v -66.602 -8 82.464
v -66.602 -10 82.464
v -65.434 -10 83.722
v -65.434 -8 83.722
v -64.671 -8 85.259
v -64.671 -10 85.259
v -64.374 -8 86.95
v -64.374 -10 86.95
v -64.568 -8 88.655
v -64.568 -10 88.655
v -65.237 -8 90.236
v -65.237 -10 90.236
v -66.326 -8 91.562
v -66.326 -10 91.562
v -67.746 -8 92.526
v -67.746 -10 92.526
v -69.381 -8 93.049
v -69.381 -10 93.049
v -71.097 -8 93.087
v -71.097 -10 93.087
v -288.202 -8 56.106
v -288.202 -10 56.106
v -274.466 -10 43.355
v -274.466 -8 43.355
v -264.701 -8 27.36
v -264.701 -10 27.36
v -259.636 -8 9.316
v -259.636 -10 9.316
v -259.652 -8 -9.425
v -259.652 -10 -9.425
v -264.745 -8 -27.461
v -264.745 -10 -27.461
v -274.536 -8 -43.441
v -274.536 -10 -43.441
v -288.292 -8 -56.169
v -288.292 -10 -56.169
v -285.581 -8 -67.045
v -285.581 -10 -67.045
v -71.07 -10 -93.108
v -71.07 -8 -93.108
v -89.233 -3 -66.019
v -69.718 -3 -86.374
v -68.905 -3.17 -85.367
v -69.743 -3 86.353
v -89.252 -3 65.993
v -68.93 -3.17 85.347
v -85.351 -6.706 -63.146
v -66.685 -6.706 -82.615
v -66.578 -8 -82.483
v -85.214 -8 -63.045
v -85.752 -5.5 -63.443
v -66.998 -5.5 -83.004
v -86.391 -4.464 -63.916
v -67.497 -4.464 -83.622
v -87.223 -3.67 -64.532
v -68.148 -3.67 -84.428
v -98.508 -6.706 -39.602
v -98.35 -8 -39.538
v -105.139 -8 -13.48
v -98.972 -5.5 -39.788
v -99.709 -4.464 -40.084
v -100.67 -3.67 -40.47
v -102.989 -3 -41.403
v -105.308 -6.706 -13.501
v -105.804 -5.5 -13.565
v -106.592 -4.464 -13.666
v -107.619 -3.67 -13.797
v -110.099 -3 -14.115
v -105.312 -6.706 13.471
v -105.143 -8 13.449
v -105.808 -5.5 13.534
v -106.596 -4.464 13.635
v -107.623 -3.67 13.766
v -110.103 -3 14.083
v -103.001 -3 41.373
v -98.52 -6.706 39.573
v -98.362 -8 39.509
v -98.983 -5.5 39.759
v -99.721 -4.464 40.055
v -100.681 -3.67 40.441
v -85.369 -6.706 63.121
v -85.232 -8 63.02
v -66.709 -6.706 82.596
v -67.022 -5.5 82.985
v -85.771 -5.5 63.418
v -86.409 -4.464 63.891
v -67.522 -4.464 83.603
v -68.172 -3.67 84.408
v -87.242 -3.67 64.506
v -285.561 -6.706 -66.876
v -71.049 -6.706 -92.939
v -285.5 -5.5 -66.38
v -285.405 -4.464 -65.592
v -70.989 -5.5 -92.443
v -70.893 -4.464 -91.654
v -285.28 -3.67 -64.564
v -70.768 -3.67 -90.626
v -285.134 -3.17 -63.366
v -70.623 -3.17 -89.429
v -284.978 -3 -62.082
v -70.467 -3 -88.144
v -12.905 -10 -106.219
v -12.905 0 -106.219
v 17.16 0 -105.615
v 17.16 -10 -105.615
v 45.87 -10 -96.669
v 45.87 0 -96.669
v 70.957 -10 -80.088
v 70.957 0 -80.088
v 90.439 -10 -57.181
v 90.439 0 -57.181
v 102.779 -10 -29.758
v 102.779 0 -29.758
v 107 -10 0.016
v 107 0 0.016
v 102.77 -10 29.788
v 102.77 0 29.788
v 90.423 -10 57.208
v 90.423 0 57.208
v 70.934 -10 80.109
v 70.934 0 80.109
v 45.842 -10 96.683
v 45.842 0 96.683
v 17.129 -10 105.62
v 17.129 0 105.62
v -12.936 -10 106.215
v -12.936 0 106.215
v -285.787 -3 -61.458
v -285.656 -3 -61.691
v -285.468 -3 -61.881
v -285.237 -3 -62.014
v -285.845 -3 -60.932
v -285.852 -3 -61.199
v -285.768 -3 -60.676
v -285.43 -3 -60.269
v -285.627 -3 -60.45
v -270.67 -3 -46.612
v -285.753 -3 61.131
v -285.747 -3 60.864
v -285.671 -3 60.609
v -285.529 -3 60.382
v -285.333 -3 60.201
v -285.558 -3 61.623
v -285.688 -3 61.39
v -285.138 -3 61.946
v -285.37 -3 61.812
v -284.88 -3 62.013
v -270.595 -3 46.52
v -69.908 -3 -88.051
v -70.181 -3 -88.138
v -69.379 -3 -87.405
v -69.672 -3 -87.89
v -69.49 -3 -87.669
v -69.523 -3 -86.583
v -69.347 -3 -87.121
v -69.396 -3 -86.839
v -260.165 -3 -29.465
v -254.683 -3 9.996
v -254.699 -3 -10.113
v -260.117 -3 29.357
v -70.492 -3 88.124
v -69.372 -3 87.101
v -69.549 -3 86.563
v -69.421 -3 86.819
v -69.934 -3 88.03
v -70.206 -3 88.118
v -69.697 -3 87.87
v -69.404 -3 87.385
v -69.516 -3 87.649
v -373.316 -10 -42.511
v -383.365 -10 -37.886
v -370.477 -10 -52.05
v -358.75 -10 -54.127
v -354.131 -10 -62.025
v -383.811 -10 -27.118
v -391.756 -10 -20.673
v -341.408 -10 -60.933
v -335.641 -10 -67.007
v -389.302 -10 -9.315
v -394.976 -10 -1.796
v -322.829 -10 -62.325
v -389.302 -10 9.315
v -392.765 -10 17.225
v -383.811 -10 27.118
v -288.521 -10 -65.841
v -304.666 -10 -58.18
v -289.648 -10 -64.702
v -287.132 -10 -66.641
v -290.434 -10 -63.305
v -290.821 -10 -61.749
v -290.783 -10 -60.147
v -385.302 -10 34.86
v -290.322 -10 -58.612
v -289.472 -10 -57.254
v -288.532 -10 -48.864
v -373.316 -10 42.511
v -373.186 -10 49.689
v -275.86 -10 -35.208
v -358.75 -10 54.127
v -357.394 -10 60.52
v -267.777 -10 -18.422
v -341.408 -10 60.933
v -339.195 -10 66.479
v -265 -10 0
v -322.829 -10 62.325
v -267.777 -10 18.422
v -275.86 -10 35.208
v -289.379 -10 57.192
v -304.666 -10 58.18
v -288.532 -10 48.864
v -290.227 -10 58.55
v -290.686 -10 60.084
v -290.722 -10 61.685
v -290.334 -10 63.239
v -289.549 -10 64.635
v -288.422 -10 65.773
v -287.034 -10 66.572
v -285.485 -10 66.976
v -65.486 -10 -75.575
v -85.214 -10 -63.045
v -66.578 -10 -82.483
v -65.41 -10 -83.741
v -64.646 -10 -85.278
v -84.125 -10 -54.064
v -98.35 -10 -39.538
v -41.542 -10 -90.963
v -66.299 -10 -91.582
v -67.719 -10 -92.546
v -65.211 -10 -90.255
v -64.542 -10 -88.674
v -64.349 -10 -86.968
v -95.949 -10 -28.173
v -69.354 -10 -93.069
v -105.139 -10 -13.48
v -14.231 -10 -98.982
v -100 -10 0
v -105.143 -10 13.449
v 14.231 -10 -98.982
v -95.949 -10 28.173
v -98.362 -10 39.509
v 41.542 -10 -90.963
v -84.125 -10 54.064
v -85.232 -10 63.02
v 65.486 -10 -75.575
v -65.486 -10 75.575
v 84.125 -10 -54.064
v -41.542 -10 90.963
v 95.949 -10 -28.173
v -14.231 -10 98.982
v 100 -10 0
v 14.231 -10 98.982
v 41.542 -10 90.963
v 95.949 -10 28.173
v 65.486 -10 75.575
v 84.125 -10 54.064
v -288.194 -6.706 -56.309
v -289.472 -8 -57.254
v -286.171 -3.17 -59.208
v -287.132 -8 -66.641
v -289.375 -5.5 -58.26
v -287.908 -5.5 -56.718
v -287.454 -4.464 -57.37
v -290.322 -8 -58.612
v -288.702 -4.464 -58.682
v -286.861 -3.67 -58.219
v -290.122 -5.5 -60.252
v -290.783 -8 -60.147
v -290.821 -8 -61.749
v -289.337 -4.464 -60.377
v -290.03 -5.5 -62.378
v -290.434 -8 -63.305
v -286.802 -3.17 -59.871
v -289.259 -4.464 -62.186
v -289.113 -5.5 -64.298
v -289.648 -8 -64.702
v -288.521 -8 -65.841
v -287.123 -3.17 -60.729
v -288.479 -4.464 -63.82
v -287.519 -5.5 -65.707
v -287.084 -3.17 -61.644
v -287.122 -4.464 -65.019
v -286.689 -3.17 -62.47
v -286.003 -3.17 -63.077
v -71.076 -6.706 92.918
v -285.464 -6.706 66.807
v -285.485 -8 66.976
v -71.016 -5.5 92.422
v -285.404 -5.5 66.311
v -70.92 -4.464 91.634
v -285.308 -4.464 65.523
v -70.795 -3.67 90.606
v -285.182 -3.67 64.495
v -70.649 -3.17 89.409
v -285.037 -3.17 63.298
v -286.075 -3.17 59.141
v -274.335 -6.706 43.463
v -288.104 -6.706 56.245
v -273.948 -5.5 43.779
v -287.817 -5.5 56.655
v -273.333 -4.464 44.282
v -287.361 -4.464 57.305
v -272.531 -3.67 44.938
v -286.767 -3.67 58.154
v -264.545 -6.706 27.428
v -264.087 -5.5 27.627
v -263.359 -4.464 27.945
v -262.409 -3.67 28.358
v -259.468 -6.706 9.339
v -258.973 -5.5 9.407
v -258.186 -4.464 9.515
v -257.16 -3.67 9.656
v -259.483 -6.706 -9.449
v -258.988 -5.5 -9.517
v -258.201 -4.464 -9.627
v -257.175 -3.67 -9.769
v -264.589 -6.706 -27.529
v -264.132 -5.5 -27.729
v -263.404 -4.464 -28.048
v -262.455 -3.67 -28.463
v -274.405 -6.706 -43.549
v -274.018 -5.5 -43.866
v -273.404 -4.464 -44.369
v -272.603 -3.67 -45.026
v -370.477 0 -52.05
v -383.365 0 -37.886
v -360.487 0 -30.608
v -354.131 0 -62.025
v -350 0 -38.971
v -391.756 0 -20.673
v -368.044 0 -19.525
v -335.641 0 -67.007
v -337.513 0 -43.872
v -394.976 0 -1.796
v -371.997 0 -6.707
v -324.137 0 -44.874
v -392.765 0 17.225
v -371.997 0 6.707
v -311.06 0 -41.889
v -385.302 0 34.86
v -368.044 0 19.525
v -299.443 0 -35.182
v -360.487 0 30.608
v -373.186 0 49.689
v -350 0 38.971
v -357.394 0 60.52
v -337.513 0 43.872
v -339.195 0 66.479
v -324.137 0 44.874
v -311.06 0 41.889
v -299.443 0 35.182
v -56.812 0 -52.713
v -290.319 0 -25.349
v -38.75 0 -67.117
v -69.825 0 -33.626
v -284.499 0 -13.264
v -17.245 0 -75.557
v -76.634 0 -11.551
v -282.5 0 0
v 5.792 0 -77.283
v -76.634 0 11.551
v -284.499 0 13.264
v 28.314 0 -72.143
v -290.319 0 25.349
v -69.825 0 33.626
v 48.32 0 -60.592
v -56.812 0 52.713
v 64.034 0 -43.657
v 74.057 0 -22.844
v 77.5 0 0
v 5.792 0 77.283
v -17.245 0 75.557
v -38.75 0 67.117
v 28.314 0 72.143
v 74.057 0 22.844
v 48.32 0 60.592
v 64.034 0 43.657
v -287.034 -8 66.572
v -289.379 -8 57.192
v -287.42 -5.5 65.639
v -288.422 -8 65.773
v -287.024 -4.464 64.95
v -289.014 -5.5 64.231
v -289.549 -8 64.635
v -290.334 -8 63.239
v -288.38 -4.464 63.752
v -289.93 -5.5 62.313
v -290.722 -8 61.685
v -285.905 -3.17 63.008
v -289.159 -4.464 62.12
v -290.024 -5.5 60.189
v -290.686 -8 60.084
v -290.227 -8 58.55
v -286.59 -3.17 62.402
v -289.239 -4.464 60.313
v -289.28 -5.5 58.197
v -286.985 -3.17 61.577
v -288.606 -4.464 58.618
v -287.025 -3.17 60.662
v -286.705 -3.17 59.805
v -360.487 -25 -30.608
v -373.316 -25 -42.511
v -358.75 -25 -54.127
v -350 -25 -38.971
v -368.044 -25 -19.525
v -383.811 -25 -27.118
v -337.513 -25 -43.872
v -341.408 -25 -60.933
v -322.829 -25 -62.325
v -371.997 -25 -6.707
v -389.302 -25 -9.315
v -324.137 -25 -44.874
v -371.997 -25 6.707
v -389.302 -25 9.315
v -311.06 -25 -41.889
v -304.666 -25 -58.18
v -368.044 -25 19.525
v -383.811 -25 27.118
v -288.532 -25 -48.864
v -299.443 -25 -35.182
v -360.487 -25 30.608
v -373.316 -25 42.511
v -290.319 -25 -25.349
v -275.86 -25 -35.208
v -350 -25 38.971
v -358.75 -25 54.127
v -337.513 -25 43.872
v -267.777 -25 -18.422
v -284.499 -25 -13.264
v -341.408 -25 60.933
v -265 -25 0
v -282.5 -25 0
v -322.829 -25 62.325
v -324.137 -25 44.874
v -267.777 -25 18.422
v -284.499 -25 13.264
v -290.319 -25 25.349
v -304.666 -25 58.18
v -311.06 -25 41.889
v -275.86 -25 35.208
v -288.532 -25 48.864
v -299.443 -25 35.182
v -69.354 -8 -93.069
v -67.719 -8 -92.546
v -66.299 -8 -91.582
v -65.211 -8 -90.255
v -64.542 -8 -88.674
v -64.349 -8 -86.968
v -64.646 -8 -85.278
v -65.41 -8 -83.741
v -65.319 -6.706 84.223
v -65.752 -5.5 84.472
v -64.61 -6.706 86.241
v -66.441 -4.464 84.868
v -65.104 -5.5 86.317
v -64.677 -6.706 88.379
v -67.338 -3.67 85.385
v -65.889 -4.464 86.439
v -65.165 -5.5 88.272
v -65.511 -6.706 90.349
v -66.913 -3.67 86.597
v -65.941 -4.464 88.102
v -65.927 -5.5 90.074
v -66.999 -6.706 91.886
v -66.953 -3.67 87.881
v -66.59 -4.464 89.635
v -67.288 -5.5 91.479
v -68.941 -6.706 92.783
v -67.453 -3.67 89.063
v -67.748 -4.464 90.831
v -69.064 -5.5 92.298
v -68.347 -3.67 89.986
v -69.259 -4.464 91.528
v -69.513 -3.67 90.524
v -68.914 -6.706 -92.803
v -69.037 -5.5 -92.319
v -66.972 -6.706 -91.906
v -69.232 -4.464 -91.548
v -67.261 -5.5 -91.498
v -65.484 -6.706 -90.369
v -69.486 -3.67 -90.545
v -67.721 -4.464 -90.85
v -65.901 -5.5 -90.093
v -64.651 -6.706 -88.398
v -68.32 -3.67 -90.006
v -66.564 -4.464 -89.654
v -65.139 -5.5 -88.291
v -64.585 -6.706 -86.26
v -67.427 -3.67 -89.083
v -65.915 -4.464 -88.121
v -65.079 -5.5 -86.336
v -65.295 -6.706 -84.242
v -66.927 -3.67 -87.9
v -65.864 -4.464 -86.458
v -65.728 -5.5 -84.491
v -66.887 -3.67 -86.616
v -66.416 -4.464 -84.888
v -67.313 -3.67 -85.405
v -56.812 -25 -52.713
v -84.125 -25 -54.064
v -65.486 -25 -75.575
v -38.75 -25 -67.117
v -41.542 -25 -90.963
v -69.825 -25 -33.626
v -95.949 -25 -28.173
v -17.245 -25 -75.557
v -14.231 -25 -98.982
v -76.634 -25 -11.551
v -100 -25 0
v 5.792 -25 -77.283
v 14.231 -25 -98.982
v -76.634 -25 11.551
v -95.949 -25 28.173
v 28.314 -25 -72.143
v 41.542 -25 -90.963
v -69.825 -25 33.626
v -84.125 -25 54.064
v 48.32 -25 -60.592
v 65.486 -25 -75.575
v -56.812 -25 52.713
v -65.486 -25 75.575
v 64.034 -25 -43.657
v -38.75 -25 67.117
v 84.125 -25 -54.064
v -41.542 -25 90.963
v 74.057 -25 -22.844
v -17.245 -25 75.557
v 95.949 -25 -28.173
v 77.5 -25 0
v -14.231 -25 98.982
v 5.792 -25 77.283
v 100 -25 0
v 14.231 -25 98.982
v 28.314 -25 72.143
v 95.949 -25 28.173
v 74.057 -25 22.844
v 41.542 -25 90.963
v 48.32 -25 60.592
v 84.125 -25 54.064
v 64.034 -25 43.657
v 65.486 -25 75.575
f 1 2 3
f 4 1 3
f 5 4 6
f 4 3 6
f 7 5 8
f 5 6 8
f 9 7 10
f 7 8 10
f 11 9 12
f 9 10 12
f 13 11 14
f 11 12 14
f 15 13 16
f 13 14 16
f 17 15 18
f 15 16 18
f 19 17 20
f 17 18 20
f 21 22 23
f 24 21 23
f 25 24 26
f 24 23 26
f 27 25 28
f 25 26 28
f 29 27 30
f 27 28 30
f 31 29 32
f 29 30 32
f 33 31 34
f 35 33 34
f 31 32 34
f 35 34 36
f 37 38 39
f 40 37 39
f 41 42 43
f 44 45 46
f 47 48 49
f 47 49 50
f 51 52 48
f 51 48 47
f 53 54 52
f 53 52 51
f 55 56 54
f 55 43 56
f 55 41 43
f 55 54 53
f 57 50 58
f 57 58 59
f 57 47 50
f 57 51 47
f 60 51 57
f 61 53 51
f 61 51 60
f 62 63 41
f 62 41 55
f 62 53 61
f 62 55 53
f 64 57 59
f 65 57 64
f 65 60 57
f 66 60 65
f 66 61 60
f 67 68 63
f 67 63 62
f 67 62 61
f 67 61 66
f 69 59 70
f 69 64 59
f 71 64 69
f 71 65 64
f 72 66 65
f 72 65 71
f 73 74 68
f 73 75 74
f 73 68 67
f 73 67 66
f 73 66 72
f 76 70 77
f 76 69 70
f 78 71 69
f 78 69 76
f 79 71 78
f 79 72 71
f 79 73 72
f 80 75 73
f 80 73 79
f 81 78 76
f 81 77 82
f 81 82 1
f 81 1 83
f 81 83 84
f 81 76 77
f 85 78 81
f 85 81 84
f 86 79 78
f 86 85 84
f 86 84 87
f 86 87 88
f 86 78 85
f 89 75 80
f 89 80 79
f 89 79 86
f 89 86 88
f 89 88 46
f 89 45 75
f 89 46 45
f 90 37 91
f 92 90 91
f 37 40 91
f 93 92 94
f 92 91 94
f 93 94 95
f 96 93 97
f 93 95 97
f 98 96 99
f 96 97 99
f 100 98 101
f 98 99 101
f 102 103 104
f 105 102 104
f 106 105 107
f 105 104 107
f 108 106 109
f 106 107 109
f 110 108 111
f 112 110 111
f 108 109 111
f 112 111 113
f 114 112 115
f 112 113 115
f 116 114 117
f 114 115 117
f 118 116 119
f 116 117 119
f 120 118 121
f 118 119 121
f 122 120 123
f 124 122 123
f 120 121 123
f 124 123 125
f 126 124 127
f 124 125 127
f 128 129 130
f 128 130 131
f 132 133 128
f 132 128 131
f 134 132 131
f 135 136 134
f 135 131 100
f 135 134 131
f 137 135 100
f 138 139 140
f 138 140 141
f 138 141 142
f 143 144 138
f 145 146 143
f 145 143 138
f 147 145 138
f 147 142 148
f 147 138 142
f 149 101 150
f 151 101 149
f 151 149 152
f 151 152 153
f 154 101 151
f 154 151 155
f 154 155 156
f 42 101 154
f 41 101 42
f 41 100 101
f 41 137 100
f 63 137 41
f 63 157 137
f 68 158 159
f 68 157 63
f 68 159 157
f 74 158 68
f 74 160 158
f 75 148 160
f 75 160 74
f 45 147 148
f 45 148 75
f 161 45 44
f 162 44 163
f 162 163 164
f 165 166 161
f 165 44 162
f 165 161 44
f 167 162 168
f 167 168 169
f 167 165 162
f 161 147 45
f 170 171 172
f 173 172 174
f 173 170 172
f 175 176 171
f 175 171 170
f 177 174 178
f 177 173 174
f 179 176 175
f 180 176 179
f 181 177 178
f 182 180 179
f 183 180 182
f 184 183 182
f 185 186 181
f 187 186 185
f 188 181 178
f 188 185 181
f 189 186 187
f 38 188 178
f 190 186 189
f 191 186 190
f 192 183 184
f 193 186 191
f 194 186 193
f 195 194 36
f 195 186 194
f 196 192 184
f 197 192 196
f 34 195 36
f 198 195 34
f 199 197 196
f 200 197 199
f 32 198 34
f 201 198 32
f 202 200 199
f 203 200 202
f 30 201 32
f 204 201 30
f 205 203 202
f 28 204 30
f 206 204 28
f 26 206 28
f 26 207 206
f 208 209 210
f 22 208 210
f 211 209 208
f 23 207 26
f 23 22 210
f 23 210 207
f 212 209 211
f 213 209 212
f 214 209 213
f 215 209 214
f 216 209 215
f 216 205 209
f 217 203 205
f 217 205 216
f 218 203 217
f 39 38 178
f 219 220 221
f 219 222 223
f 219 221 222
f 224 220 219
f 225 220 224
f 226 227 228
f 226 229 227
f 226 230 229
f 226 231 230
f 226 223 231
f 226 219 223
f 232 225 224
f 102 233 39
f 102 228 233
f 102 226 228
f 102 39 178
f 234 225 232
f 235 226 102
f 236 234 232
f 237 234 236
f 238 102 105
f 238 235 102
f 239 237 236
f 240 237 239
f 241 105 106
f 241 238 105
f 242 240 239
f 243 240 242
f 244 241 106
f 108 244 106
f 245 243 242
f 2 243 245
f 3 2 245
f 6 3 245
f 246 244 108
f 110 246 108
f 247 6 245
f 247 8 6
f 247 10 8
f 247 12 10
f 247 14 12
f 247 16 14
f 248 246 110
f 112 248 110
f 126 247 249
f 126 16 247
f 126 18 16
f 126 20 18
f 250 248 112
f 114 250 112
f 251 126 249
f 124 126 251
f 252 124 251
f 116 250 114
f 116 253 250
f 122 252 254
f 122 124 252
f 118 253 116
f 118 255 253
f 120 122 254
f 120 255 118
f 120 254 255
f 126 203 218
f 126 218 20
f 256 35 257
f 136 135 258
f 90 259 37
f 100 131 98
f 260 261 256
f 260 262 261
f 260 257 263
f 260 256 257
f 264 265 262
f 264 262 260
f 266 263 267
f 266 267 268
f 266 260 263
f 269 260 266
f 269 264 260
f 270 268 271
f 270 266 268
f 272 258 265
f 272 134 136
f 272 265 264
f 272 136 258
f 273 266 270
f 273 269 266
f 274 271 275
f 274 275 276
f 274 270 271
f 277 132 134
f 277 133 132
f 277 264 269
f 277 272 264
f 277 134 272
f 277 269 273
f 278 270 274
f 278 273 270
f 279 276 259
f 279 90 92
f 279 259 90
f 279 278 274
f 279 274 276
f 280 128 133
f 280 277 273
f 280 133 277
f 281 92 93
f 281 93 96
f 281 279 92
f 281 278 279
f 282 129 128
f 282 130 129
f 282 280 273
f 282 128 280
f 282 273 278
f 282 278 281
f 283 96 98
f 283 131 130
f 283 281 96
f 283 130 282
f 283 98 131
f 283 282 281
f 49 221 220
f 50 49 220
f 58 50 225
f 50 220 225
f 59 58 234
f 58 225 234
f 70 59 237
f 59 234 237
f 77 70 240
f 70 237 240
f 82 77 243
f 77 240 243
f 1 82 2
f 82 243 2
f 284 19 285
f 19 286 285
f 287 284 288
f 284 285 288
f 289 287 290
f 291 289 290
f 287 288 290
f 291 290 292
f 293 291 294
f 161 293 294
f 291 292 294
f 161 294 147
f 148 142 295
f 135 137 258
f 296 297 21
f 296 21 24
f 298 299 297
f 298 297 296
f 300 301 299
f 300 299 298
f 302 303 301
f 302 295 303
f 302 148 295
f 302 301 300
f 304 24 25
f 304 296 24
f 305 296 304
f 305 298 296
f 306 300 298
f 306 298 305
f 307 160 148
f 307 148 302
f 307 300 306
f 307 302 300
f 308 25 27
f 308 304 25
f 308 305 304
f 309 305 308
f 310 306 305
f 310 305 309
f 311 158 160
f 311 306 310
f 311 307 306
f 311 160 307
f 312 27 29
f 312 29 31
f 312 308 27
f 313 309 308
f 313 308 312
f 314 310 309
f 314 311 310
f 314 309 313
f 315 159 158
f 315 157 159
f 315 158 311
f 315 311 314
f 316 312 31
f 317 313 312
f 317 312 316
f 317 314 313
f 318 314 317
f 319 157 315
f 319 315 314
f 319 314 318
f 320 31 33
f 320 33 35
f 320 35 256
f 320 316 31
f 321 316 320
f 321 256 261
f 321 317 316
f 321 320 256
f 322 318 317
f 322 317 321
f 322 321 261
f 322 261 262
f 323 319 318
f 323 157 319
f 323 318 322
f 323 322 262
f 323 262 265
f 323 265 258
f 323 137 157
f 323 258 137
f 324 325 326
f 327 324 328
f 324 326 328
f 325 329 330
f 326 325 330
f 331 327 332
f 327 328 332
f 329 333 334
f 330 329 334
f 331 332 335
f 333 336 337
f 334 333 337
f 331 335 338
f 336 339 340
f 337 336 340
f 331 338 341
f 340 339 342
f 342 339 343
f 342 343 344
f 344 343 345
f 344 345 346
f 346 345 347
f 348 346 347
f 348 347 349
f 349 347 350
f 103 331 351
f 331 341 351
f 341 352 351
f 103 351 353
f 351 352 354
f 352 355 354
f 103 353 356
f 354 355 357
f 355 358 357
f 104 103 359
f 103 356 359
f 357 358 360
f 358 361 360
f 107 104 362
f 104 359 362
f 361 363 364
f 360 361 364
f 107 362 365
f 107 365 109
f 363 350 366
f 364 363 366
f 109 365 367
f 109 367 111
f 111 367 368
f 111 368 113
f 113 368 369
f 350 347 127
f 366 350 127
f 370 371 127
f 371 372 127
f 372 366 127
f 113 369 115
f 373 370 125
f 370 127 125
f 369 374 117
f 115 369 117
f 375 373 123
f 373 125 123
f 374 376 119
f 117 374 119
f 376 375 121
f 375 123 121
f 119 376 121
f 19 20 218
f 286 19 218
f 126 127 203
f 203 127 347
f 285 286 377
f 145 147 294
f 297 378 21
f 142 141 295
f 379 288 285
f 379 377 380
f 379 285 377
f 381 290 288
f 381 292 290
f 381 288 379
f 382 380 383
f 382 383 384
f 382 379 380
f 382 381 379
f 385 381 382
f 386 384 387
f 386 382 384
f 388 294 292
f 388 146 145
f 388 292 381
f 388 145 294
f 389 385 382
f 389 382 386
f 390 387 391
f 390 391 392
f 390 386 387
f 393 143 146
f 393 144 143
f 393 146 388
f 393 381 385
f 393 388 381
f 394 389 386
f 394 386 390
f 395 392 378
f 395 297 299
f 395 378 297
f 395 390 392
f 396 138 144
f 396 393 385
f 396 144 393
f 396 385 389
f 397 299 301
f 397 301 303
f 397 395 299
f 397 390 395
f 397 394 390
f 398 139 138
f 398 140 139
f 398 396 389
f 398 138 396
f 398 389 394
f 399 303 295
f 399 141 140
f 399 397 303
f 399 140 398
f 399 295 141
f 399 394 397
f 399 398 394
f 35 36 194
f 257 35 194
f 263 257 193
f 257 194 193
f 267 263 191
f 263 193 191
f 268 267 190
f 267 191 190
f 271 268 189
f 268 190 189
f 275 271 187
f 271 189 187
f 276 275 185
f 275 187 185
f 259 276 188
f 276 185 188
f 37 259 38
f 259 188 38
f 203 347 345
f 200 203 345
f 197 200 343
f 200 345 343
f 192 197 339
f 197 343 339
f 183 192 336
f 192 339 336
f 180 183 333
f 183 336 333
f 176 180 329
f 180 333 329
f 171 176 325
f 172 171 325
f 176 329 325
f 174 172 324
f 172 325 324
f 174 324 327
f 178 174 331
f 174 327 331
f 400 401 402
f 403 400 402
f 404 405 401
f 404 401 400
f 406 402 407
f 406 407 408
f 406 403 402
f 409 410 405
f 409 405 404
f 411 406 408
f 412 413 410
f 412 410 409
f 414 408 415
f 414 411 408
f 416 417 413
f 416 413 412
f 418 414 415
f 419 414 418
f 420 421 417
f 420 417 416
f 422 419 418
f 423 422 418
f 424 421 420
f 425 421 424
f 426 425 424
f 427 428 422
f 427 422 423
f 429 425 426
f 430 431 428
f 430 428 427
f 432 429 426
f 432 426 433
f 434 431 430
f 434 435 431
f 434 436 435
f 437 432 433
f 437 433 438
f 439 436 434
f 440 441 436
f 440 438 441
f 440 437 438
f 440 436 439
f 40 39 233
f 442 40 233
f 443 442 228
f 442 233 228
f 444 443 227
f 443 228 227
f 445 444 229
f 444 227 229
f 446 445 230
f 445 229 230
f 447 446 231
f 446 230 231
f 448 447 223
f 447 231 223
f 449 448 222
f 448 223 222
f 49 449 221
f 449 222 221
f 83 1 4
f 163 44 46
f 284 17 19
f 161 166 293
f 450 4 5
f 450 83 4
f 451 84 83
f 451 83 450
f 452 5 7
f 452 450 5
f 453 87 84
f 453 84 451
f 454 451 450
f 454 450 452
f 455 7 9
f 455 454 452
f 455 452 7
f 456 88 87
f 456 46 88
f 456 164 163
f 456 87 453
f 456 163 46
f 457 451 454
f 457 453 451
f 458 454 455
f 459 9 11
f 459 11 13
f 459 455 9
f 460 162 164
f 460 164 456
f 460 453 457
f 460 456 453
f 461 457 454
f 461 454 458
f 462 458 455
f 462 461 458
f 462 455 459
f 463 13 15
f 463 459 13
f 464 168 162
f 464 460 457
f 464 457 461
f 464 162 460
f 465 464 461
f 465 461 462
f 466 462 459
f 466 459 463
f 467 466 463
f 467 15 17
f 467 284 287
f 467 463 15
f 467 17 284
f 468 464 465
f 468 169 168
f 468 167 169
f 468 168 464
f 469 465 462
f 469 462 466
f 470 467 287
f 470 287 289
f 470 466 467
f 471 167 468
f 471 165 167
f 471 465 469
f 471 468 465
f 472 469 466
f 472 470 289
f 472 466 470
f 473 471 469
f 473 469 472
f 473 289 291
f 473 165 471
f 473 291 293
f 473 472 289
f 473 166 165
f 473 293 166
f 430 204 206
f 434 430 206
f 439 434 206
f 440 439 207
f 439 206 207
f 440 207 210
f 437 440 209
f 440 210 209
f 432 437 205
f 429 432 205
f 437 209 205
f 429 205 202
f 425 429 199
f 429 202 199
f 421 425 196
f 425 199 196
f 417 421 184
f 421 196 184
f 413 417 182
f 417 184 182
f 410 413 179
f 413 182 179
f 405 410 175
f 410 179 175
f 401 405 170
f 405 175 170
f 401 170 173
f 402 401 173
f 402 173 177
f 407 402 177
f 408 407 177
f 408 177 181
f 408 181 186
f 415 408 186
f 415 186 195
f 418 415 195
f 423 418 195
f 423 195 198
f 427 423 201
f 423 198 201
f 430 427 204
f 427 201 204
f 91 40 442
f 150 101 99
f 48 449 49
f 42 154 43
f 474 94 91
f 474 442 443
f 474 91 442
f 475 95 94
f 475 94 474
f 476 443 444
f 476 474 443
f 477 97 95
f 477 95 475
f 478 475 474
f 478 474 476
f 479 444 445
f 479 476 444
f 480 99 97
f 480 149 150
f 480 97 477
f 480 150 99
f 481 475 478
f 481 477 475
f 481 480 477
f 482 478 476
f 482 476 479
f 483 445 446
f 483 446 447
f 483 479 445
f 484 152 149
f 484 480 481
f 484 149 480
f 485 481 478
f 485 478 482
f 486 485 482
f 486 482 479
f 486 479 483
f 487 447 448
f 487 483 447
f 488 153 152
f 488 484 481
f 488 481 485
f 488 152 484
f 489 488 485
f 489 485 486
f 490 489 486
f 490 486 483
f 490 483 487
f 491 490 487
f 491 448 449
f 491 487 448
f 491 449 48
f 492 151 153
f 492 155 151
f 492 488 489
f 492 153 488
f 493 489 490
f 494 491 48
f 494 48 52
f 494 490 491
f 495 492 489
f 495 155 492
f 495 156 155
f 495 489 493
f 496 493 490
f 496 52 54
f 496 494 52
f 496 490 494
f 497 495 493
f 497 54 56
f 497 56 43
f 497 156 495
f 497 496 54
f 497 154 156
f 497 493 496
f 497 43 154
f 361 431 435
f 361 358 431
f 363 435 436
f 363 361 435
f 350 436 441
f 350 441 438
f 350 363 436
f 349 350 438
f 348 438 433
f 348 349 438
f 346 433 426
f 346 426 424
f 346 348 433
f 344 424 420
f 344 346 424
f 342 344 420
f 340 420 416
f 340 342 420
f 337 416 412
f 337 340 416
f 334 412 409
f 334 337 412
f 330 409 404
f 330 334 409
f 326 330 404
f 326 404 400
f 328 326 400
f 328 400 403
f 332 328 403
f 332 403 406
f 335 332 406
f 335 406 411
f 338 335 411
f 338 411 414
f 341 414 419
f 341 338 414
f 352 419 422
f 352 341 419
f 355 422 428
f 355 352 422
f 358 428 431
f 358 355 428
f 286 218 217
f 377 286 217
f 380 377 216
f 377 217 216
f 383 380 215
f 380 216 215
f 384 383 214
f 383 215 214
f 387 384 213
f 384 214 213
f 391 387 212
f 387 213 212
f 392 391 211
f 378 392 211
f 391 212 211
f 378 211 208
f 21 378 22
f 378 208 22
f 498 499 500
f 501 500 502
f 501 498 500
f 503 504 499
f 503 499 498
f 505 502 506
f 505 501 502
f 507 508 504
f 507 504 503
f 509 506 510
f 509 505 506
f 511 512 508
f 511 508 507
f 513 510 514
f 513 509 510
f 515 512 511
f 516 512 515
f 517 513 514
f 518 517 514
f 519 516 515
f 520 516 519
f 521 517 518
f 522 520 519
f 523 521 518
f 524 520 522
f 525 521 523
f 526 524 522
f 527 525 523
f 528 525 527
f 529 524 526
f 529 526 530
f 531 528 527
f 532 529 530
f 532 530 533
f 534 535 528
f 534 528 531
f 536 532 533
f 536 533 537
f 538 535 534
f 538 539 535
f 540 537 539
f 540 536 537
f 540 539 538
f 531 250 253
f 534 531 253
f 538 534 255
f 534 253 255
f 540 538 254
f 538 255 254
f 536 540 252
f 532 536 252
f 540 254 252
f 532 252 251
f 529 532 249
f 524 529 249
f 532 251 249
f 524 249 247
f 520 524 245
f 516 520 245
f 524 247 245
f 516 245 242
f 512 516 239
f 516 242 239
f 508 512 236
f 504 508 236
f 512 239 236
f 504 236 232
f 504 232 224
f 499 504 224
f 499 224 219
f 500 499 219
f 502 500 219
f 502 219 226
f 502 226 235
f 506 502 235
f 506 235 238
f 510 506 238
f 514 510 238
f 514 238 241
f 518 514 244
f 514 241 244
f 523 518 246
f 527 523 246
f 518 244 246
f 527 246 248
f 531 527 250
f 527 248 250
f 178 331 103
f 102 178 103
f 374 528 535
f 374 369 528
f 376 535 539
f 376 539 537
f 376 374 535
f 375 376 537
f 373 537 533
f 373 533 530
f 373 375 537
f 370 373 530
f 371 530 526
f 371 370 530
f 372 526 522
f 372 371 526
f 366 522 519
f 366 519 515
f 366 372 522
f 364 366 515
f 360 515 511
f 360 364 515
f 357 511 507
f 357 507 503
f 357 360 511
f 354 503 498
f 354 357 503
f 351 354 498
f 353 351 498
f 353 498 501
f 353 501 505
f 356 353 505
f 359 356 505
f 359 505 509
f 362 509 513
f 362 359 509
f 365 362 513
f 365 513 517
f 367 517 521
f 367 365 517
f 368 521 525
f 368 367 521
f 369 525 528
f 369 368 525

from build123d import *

# Parameters (mm, degrees)
F0_R          = 62.5
F0_R_2        = 100
F1_DEPTH      = 10
F2_R          = 62.5
F2_R_2        = 45
F2_R_3        = 100
F2_R_4        = 77.5
F3_DEPTH      = 15
F3_DEPTH_BACK = 10
F5_DEPTH      = 7
F6_R          = 5


with BuildPart() as f1:
    # F0 (on Front) → F1 (new body)
    with BuildSketch(Plane.XZ):
        with BuildLine():
            Line((-335.641221, -67.007242), (-12.905344, -106.218888))
            ThreePointArc((-12.905344, -106.218888), (106.999999, 0.015565), (-12.936245, 106.215129))
            Line((-12.936245, 106.215129), (-339.19516, 66.479119))
            ThreePointArc((-339.19516, 66.479119), (-394.976089, -1.796482), (-335.641221, -67.007242))
        make_face()
        with Locations((-327.5, 0)):
            Circle(F0_R, mode=Mode.SUBTRACT)
        Circle(F0_R_2, mode=Mode.SUBTRACT)
    extrude(amount=F1_DEPTH)

    # F2 (on face) → F3 (join, two sides)
    with BuildSketch(Plane.XZ.offset(10)) as f3_sk:
        with Locations((-327.5, 0)):
            Circle(F2_R)
        with Locations((-327.5, 0)):
            Circle(F2_R_2, mode=Mode.SUBTRACT)
        Circle(F2_R_3)
        Circle(F2_R_4, mode=Mode.SUBTRACT)
    extrude(amount=F3_DEPTH)
    extrude(f3_sk.sketch, amount=-F3_DEPTH_BACK)

    # F4 (on face) → F5 (cut)
    with BuildSketch(Plane.XZ.offset(10)):
        with BuildLine():
            ThreePointArc((-66.577581, -82.482881), (-105.999999, -0.015419), (-66.601576, 82.463508))
            ThreePointArc((-66.601576, 82.463508), (-64.845792, 89.469376), (-71.096873, 93.087242))
            Line((-71.096873, 93.087242), (-285.484696, 66.976334))
            ThreePointArc((-285.484696, 66.976334), (-290.580254, 62.475162), (-288.201504, 56.105955))
            ThreePointArc((-288.201504, 56.105955), (-259.000022, -0.055148), (-288.291894, -56.169159))
            ThreePointArc((-288.291894, -56.169159), (-290.67952, -62.540062), (-285.581272, -67.045285))
            Line((-285.581272, -67.045285), (-71.069788, -93.107923))
            ThreePointArc((-71.069788, -93.107923), (-64.81976, -89.488238), (-66.577581, -82.482881))
        make_face()
    extrude(amount=-F5_DEPTH, mode=Mode.SUBTRACT)

    # F6
    f6_edges = [f1.edges().sort_by_distance(p)[0] for p in [
        (-105.999999, -3, -0.015419),
    ]]
    fillet(f6_edges, radius=F6_R)


solid = f1.part
